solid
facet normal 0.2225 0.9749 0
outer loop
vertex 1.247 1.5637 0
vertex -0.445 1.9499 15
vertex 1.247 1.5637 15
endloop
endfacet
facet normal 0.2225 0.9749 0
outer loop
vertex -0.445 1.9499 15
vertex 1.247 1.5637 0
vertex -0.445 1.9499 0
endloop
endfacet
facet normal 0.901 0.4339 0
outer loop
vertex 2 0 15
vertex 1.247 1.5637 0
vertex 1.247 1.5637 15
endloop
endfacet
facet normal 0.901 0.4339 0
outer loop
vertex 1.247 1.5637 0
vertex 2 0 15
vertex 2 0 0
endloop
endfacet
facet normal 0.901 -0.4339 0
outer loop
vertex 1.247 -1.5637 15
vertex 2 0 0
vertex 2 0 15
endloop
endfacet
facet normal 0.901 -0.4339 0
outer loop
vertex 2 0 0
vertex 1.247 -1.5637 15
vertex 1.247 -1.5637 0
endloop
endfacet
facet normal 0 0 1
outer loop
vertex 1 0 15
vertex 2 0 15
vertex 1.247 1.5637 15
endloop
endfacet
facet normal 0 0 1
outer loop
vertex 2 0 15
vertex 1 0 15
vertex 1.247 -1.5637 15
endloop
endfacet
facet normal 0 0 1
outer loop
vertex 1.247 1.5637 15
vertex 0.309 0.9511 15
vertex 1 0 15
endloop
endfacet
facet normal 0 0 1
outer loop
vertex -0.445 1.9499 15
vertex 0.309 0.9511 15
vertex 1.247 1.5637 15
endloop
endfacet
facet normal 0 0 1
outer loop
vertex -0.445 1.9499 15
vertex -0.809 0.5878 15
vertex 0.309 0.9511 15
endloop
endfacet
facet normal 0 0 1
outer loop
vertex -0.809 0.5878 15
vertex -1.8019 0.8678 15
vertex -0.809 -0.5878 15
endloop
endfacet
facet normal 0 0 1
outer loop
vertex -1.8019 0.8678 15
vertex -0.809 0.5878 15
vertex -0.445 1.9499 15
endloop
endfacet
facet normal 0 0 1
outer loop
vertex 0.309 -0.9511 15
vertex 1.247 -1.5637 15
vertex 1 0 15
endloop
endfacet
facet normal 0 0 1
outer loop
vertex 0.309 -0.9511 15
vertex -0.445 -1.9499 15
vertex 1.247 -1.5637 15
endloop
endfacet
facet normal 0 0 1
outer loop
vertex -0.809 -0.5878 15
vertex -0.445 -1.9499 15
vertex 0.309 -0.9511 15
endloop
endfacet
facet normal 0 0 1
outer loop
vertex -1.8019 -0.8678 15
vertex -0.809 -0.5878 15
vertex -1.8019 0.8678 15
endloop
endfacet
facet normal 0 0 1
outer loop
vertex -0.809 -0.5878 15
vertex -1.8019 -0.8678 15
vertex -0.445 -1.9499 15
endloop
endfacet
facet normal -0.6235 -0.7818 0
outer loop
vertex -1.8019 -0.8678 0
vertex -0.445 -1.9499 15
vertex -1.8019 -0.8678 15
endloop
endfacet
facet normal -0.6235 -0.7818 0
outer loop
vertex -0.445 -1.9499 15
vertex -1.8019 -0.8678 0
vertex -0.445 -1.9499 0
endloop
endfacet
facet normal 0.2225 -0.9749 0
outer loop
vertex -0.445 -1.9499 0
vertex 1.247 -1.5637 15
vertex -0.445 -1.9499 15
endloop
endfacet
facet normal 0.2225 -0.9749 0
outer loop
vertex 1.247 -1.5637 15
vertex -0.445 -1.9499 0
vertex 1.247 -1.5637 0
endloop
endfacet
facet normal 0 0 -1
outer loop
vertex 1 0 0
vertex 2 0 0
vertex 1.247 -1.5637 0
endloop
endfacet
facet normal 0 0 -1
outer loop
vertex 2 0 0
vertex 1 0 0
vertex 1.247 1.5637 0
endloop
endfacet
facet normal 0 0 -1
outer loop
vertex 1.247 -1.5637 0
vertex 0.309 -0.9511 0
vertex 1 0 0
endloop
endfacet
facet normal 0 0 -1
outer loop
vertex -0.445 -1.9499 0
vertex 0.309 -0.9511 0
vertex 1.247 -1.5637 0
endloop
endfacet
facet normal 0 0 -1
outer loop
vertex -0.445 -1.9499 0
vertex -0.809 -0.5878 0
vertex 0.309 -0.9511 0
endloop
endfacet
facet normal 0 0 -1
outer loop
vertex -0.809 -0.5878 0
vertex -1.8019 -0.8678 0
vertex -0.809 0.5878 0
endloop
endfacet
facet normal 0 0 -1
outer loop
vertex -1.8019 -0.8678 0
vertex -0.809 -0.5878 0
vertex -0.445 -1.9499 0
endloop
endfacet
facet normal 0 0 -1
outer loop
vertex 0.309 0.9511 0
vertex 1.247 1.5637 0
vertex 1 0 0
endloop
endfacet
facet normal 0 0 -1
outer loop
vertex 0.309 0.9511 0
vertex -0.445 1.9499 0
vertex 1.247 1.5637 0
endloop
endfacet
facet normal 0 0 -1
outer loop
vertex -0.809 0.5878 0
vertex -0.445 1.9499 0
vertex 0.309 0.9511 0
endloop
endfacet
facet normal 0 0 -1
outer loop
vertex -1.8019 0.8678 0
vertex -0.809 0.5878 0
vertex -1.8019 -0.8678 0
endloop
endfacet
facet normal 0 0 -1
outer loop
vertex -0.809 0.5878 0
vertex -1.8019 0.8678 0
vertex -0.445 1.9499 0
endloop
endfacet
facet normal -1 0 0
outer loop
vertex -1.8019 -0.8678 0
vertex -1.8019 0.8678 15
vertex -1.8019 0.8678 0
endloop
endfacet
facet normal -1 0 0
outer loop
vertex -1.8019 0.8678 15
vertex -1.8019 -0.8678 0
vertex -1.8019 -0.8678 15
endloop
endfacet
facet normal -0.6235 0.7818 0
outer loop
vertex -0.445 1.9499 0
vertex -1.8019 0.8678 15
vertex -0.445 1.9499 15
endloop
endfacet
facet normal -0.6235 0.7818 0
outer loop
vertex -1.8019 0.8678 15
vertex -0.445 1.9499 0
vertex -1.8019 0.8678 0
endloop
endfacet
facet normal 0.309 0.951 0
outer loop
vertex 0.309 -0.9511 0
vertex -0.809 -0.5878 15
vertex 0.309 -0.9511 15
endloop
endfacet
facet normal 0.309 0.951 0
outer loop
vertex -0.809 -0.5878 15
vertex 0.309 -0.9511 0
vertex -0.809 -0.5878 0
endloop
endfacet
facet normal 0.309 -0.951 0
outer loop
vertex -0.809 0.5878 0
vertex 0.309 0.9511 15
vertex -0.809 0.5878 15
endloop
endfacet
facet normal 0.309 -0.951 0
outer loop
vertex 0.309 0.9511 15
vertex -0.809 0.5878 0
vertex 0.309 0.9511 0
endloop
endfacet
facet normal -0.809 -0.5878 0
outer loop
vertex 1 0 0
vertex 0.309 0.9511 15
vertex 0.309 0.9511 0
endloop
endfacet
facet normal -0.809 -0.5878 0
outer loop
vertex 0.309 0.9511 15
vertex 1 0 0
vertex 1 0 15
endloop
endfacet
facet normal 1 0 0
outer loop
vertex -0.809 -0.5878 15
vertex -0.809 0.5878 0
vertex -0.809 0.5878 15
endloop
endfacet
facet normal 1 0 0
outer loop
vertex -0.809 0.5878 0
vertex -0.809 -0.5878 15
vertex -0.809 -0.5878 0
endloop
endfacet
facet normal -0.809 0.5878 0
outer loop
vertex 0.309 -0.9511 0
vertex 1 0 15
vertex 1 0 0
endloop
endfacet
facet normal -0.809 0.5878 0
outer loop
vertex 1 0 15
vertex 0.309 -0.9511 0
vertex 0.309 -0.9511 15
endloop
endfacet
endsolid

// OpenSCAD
// Parameters
length = 15; //[8:30:1]
center = 1; //[0:1:1]
forced_id = 0; //[0:10:0.1]
type_od = 4; //[2:8:0.1]
type_id = 2; //[1:6:0.1]
eps = 0.5; //[0.2:2:0.1]

// Tubing - complete geometry
module tubing() {
  color([0.85, 0.85, 0.8]) { // PTFE color
    difference() {
      // Outer cylinder
      cylinder(
        h = length,
        r = (type_od + (forced_id > 0 ? (forced_id - type_id) : 0)) / 2,
        center = center
      );
      // Inner cylinder (cutout)
      translate([0, 0, -eps]) // Adjust for epsilon
        cylinder(
          h = length + 2 * eps,
          r = (forced_id > 0 ? forced_id : type_id) / 2,
          center = center
        );
    }
  }
}

// Assembly
module assembly() {
  if (center == 1) {
    tubing();
  } else {
    translate([0, 0, length / 2]) tubing();
  }
}

assembly();
